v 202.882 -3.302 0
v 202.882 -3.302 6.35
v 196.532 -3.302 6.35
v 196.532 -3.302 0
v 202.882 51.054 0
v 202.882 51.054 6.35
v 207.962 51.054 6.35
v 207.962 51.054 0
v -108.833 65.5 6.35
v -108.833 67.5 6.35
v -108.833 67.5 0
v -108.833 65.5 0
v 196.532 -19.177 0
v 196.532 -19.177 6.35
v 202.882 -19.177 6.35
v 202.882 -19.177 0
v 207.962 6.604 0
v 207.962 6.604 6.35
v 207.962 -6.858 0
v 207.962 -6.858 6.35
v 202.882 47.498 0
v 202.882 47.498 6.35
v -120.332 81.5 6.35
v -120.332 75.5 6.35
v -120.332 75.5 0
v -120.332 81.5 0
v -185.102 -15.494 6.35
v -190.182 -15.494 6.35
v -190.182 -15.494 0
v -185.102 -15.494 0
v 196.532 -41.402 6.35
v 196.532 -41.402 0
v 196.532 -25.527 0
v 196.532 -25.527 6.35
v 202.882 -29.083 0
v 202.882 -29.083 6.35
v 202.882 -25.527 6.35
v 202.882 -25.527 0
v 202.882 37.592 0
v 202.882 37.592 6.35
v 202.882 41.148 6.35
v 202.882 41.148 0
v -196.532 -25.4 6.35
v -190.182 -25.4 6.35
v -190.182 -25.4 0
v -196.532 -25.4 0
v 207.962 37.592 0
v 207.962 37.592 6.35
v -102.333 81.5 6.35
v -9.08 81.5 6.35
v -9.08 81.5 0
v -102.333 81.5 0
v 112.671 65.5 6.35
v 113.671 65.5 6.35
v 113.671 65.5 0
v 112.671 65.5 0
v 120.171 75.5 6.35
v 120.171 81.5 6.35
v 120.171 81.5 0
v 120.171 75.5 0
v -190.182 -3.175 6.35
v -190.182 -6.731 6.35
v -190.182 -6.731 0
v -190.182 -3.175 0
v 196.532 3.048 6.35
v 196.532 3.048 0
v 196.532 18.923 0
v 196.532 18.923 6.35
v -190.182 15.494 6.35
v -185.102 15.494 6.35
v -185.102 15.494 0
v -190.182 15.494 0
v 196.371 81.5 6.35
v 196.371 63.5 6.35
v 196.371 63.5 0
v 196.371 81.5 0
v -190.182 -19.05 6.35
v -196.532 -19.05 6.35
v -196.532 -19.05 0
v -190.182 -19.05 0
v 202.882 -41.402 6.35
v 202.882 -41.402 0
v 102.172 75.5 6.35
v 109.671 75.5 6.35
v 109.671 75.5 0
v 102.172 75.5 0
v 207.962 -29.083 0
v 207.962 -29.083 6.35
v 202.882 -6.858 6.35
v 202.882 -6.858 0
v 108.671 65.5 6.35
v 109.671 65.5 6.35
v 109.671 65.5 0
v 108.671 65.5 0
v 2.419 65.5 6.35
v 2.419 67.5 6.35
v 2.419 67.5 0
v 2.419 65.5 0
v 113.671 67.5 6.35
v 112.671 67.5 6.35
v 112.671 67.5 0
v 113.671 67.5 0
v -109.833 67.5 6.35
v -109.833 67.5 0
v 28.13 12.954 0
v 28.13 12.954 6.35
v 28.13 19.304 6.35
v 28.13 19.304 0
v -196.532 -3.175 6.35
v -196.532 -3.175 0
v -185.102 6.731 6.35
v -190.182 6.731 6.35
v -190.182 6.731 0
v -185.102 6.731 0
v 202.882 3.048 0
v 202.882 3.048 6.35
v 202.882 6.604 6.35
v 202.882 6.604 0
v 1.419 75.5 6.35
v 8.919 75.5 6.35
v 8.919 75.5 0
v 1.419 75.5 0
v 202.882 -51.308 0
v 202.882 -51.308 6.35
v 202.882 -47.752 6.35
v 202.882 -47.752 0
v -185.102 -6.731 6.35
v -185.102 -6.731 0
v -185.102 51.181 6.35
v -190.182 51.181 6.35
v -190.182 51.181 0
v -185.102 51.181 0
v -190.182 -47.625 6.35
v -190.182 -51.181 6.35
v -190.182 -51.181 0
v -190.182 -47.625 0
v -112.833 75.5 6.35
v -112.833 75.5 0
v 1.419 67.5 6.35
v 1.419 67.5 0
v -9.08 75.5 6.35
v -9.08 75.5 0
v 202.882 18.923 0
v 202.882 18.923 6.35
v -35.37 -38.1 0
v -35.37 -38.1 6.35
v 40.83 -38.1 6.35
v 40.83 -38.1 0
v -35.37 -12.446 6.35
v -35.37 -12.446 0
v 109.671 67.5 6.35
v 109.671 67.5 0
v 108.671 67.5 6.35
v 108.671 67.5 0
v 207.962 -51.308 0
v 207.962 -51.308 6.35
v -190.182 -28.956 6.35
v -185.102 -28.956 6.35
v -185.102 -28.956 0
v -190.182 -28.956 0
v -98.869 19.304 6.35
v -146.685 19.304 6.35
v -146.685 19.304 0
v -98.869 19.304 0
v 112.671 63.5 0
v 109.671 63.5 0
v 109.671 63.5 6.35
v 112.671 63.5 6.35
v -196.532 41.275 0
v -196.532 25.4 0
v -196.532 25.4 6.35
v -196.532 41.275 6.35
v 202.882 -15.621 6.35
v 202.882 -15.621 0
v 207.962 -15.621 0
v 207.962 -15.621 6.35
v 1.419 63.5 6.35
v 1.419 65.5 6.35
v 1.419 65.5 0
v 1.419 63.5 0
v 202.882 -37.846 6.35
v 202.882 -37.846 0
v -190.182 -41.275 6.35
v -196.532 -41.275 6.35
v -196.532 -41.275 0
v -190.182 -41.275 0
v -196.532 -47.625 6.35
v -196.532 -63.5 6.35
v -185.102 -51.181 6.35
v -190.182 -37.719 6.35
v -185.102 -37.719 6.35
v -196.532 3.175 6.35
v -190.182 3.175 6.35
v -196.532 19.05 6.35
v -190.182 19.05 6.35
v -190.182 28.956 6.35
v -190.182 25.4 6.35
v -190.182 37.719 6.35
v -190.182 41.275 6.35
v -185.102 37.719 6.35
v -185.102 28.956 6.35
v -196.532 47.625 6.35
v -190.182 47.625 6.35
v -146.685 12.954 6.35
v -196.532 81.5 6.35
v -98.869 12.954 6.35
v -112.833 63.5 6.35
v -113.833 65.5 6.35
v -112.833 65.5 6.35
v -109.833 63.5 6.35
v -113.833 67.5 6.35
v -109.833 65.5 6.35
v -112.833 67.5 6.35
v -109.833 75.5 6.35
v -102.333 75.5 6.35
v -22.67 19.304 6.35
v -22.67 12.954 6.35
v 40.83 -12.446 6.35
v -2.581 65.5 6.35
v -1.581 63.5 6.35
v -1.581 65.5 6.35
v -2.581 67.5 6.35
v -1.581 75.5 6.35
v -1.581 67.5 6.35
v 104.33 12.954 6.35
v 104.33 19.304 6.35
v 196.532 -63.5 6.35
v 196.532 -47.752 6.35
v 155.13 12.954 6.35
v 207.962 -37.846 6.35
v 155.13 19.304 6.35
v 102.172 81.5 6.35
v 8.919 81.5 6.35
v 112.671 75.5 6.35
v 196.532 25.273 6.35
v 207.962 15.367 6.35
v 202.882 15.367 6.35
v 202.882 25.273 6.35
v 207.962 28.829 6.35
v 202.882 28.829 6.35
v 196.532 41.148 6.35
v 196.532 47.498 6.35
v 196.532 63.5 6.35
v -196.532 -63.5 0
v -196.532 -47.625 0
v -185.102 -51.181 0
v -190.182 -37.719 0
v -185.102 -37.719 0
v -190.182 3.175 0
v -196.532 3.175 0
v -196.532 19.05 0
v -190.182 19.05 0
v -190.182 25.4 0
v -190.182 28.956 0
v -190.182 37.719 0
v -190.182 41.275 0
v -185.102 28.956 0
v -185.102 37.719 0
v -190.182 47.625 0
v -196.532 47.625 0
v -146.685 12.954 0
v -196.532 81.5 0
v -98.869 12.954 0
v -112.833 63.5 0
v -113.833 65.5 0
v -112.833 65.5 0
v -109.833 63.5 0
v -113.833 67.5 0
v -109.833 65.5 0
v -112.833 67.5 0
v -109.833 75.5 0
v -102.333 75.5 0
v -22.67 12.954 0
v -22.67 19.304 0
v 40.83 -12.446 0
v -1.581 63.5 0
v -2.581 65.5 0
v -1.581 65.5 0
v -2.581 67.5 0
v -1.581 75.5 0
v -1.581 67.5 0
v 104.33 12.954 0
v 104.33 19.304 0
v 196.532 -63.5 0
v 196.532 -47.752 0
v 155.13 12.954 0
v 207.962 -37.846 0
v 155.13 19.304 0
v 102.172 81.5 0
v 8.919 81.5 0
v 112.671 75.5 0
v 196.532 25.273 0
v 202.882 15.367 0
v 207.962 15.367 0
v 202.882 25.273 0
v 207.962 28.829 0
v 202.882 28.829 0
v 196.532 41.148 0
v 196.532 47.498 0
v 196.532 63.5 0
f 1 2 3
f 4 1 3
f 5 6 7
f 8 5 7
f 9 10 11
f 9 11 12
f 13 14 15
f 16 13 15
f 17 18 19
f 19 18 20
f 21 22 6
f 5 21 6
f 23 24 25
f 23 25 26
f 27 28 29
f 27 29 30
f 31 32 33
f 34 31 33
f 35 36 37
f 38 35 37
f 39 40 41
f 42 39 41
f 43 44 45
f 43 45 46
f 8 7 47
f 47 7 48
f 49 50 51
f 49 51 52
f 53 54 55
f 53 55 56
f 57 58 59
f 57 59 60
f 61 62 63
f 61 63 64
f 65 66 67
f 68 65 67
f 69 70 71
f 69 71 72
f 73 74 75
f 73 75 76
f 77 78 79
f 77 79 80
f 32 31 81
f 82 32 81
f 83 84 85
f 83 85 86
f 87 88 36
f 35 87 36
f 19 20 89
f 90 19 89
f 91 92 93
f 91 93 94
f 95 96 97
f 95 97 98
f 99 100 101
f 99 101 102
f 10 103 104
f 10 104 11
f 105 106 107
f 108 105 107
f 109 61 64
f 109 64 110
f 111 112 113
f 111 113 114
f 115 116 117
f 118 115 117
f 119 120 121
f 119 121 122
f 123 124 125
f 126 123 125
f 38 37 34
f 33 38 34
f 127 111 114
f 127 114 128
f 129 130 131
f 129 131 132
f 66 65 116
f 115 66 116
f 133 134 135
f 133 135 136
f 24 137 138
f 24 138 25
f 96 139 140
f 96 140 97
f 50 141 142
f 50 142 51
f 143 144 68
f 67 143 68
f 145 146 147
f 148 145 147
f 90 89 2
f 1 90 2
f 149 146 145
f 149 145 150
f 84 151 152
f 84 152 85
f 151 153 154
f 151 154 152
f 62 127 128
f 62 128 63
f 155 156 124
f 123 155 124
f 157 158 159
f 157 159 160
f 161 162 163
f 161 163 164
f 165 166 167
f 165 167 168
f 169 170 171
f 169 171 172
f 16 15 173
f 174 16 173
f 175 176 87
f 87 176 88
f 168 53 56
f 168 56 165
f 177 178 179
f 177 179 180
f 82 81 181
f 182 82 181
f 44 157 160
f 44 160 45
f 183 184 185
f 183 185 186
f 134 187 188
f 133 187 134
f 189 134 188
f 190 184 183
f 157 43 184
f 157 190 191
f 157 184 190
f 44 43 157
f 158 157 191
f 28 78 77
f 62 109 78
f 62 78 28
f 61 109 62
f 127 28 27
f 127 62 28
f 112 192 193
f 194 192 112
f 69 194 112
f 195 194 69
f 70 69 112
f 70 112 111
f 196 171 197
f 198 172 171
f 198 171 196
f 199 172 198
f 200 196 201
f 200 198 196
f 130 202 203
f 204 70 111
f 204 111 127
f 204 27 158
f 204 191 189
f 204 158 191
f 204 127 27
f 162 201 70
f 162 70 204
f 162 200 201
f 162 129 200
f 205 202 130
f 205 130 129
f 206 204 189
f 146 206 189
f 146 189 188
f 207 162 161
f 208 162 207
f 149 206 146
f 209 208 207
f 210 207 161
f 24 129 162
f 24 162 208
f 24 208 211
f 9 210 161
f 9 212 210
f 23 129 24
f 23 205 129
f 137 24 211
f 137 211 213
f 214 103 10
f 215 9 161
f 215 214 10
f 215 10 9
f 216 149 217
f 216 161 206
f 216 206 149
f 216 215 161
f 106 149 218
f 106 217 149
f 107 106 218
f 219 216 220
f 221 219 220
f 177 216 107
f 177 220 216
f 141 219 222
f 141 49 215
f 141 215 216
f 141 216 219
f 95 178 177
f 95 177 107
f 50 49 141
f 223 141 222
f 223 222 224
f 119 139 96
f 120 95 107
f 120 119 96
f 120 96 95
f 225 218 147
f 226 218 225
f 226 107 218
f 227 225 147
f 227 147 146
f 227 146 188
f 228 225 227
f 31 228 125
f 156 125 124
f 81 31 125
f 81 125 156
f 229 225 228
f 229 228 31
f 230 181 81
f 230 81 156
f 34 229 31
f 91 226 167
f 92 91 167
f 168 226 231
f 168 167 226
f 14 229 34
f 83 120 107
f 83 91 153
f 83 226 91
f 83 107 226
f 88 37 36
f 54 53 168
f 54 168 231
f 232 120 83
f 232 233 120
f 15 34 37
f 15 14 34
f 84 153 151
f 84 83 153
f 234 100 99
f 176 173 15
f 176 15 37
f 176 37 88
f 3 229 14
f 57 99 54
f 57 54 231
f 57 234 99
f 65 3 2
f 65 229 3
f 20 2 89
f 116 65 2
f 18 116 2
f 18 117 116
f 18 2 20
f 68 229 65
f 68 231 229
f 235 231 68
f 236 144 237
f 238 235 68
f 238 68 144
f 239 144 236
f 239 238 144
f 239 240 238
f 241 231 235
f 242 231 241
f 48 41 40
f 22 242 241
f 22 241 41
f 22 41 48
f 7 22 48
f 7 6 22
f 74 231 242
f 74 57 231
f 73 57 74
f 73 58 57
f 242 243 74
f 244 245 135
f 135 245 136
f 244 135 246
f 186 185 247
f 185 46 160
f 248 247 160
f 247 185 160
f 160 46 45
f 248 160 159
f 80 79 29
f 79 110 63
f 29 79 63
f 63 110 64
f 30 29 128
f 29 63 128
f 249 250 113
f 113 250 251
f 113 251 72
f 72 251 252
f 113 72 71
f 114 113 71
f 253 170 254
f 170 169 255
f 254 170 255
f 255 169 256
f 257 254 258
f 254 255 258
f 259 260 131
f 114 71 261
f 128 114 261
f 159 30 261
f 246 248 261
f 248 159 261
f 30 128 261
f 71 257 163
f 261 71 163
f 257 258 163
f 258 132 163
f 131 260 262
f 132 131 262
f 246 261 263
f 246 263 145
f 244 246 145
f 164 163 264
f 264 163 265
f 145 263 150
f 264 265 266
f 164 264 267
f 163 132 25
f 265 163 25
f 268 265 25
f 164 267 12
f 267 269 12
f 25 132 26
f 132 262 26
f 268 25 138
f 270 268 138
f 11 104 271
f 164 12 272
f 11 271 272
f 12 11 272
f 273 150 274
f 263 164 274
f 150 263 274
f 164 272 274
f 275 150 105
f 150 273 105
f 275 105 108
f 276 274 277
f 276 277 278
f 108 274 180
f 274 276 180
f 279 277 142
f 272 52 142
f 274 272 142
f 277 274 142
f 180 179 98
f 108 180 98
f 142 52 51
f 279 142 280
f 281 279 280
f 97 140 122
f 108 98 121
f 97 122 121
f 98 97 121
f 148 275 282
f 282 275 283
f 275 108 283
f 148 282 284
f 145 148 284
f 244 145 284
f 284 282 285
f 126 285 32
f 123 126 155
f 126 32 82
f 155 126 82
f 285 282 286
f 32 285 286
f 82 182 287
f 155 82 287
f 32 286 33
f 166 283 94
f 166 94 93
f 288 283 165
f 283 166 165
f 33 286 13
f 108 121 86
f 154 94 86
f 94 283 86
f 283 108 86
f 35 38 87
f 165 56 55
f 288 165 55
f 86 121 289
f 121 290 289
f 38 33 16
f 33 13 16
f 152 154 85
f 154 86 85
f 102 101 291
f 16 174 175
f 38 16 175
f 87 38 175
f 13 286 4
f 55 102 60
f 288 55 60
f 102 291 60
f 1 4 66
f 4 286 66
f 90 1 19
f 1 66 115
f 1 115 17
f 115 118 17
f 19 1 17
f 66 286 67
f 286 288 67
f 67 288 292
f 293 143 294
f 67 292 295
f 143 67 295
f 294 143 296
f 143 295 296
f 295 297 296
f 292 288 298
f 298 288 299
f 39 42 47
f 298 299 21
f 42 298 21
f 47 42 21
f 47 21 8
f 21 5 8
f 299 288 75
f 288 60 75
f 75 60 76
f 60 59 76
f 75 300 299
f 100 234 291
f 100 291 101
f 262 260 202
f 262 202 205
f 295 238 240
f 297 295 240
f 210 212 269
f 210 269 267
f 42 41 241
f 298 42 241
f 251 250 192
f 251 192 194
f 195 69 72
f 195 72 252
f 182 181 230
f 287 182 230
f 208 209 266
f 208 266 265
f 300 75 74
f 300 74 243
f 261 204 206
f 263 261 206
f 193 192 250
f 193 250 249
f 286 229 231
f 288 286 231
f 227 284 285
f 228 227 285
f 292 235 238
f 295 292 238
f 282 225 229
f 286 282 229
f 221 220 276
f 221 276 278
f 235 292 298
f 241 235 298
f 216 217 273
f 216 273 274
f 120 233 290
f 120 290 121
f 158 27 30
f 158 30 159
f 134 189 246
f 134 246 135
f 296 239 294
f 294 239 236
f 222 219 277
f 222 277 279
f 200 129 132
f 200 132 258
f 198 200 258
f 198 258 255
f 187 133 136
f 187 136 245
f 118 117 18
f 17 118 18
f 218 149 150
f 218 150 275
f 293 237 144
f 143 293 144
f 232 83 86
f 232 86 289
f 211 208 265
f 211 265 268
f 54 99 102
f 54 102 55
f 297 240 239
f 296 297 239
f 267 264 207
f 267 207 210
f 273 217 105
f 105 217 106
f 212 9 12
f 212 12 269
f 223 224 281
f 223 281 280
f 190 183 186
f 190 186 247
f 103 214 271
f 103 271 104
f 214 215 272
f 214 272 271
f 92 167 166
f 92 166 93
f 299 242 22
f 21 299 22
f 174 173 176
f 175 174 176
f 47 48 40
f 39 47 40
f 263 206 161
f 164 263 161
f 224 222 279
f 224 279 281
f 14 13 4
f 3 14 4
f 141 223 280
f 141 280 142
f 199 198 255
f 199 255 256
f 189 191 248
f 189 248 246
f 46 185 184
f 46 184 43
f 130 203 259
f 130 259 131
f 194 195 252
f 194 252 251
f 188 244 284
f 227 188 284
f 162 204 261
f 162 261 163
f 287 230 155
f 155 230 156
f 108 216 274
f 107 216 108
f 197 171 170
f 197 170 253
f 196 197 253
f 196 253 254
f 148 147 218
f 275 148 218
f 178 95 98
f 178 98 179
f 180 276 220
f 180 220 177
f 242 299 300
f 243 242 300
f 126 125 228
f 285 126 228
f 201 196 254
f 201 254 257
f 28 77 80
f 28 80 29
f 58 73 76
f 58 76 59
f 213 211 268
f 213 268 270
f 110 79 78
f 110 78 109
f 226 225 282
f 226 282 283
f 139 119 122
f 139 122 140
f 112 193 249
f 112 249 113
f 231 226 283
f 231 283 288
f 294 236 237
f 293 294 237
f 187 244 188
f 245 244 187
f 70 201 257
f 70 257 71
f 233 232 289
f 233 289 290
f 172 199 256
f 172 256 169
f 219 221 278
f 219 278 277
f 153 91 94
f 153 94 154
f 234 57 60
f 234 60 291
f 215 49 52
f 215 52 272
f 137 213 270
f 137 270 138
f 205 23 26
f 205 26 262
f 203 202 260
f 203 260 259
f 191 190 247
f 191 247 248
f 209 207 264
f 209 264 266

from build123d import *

# Parameters (mm, degrees)
SKETCH1_W             = 393.065
SKETCH1_H             = 127
BOSS_EXTRUDE1_DEPTH   = 6.35
SKETCH2_W             = 76.2
SKETCH2_H             = 25.654
CUT_EXTRUDE1_DEPTH    = 6.35
CUT_EXTRUDE2_DEPTH    = 6.35
LPATTERN1_COUNT       = 5
LPATTERN1_PITCH       = 22.225
BOSS_EXTRUDE2_DEPTH   = 6.35
LPATTERN2_COUNT       = 5
LPATTERN2_PITCH       = 22.225
BOSS_EXTRUDE3_DEPTH   = 6.35
BOSS_EXTRUDE3_2_DEPTH = 6.35
LPATTERN4_COUNT       = 3
LPATTERN4_PITCH       = 111.252
SKETCH14_W            = 50.8
SKETCH14_H            = 6.35
CUT_EXTRUDE3_DEPTH    = 6.35
SKETCH16_W            = 50.8
SKETCH16_H            = 6.35
CUT_EXTRUDE4_DEPTH    = 6.35
SKETCH19_W            = 47.8155
SKETCH19_H            = 6.35
CUT_EXTRUDE5_DEPTH    = 6.35


with BuildPart() as part:
    # Sketch1 → Boss-Extrude1 (new body)
    with BuildSketch(Plane.XY):
        Rectangle(SKETCH1_W, SKETCH1_H)
    extrude(amount=BOSS_EXTRUDE1_DEPTH)

    # Sketch2 → Cut-Extrude1 (cut)
    with BuildSketch(Plane.XY.offset(6.35)):
        with Locations((2.7305, -25.273)):
            Rectangle(SKETCH2_W, SKETCH2_H)
    extrude(amount=-CUT_EXTRUDE1_DEPTH, mode=Mode.SUBTRACT)

    # Sketch3 → Cut-Extrude2 (cut)
    with BuildSketch(Plane.XY.offset(6.35)):
        Polygon((-196.5325, 47.625), (-190.1825, 47.625), (-190.1825, 51.181), (-185.1025, 51.181), (-185.1025, 37.719), (-190.1825, 37.719), (-190.1825, 41.275), (-196.5325, 41.275), align=None)
    cut_extrude2 = extrude(amount=-CUT_EXTRUDE2_DEPTH, mode=Mode.SUBTRACT)

    # LPattern1: Cut-Extrude2 ×5
    with Locations(*[(0, -i * LPATTERN1_PITCH, 0) for i in range(1, LPATTERN1_COUNT)]):
        add(cut_extrude2, mode=Mode.SUBTRACT)


with BuildPart() as body_2:
    # Sketch4 → Boss-Extrude2 (new body)
    with BuildSketch(Plane.XY.offset(6.35)):
        Polygon((196.5325, 47.498), (202.8825, 47.498), (202.8825, 51.054), (207.9625, 51.054), (207.9625, 37.592), (202.8825, 37.592), (202.8825, 41.148), (196.5325, 41.148), align=None)
    boss_extrude2 = extrude(amount=-BOSS_EXTRUDE2_DEPTH)


with BuildPart() as lpattern2_1:
    # LPattern2: pattern copy
    add(boss_extrude2.moved(Location(Vector(0, -1, 0) * (1 * LPATTERN2_PITCH))))


with BuildPart() as lpattern2_2:
    # LPattern2: pattern copy
    add(boss_extrude2.moved(Location(Vector(0, -1, 0) * (2 * LPATTERN2_PITCH))))


with BuildPart() as lpattern2_3:
    # LPattern2: pattern copy
    add(boss_extrude2.moved(Location(Vector(0, -1, 0) * (3 * LPATTERN2_PITCH))))


with BuildPart() as lpattern2_4:
    # LPattern2: pattern copy
    add(boss_extrude2.moved(Location(Vector(0, -1, 0) * (4 * LPATTERN2_PITCH))))


with BuildPart() as body_2_1:
    add(body_2.part)

    # Combine1: union part, LPattern2_1, LPattern2_2, LPattern2_3, LPattern2_4
    add(part.part)
    add(lpattern2_1.part)
    add(lpattern2_2.part)
    add(lpattern2_3.part)
    add(lpattern2_4.part)


with BuildPart() as body_2_2:
    # Sketch12 → Boss-Extrude3 (new body)
    with BuildSketch(Plane.XY.offset(6.35)):
        Polygon((-196.5325, 81.5), (-196.5325, 63.5), (-112.832500014, 63.5), (-112.832500014, 65.5), (-113.832500014, 65.5), (-113.832500014, 67.5), (-112.832500014, 67.5), (-112.832500014, 75.5), (-120.3325, 75.5), (-120.3325, 81.5), align=None)
    boss_extrude3 = extrude(amount=-BOSS_EXTRUDE3_DEPTH)


with BuildPart() as body_3:
    # Sketch12 → Boss-Extrude3 2 (new body)
    with BuildSketch(Plane.XY.offset(6.35)):
        Polygon((-109.832500014, 65.5), (-109.832500014, 63.5), (-26.132500014, 63.5), (-26.132500014, 81.5), (-102.332500014, 81.5), (-102.332500014, 75.5), (-109.832500014, 75.5), (-109.832500014, 67.5), (-108.832500014, 67.5), (-108.832500014, 65.5), align=None)
    boss_extrude3_2 = extrude(amount=-BOSS_EXTRUDE3_2_DEPTH)


with BuildPart() as lpattern4_1:
    # LPattern4: pattern copy
    add(boss_extrude3.moved(Location(Vector(1, 0, 0) * (1 * LPATTERN4_PITCH))))


with BuildPart() as lpattern4_2:
    # LPattern4: pattern copy
    add(boss_extrude3.moved(Location(Vector(1, 0, 0) * (2 * LPATTERN4_PITCH))))


with BuildPart() as lpattern4_3:
    # LPattern4: pattern copy
    add(boss_extrude3_2.moved(Location(Vector(1, 0, 0) * (1 * LPATTERN4_PITCH))))


with BuildPart() as lpattern4_4:
    # LPattern4: pattern copy
    add(boss_extrude3_2.moved(Location(Vector(1, 0, 0) * (2 * LPATTERN4_PITCH))))


with BuildPart() as body_2_2_1:
    add(body_2_2.part)

    # Combine2: union body 3, LPattern4_3, LPattern4_1, LPattern4_2, LPattern4_4, body 2
    add(body_3.part)
    add(lpattern4_3.part)
    add(lpattern4_1.part)
    add(lpattern4_2.part)
    add(lpattern4_4.part)
    add(body_2_1.part)

    # Sketch14 → Cut-Extrude3 (cut)
    with BuildSketch(Plane.XY.offset(6.35)):
        with Locations((2.7305, 16.129)):
            Rectangle(SKETCH14_W, SKETCH14_H)
    extrude(amount=-CUT_EXTRUDE3_DEPTH, mode=Mode.SUBTRACT)

    # Sketch16 → Cut-Extrude4 (cut)
    with BuildSketch(Plane.XY.offset(6.35)):
        with Locations((129.7305, 16.129)):
            Rectangle(SKETCH16_W, SKETCH16_H)
    extrude(amount=-CUT_EXTRUDE4_DEPTH, mode=Mode.SUBTRACT)

    # Sketch19 → Cut-Extrude5 (cut)
    with BuildSketch(Plane.XY.offset(6.35)):
        with Locations((-122.77725, 16.129)):
            Rectangle(SKETCH19_W, SKETCH19_H)
    extrude(amount=-CUT_EXTRUDE5_DEPTH, mode=Mode.SUBTRACT)


solid = body_2_2_1.part
